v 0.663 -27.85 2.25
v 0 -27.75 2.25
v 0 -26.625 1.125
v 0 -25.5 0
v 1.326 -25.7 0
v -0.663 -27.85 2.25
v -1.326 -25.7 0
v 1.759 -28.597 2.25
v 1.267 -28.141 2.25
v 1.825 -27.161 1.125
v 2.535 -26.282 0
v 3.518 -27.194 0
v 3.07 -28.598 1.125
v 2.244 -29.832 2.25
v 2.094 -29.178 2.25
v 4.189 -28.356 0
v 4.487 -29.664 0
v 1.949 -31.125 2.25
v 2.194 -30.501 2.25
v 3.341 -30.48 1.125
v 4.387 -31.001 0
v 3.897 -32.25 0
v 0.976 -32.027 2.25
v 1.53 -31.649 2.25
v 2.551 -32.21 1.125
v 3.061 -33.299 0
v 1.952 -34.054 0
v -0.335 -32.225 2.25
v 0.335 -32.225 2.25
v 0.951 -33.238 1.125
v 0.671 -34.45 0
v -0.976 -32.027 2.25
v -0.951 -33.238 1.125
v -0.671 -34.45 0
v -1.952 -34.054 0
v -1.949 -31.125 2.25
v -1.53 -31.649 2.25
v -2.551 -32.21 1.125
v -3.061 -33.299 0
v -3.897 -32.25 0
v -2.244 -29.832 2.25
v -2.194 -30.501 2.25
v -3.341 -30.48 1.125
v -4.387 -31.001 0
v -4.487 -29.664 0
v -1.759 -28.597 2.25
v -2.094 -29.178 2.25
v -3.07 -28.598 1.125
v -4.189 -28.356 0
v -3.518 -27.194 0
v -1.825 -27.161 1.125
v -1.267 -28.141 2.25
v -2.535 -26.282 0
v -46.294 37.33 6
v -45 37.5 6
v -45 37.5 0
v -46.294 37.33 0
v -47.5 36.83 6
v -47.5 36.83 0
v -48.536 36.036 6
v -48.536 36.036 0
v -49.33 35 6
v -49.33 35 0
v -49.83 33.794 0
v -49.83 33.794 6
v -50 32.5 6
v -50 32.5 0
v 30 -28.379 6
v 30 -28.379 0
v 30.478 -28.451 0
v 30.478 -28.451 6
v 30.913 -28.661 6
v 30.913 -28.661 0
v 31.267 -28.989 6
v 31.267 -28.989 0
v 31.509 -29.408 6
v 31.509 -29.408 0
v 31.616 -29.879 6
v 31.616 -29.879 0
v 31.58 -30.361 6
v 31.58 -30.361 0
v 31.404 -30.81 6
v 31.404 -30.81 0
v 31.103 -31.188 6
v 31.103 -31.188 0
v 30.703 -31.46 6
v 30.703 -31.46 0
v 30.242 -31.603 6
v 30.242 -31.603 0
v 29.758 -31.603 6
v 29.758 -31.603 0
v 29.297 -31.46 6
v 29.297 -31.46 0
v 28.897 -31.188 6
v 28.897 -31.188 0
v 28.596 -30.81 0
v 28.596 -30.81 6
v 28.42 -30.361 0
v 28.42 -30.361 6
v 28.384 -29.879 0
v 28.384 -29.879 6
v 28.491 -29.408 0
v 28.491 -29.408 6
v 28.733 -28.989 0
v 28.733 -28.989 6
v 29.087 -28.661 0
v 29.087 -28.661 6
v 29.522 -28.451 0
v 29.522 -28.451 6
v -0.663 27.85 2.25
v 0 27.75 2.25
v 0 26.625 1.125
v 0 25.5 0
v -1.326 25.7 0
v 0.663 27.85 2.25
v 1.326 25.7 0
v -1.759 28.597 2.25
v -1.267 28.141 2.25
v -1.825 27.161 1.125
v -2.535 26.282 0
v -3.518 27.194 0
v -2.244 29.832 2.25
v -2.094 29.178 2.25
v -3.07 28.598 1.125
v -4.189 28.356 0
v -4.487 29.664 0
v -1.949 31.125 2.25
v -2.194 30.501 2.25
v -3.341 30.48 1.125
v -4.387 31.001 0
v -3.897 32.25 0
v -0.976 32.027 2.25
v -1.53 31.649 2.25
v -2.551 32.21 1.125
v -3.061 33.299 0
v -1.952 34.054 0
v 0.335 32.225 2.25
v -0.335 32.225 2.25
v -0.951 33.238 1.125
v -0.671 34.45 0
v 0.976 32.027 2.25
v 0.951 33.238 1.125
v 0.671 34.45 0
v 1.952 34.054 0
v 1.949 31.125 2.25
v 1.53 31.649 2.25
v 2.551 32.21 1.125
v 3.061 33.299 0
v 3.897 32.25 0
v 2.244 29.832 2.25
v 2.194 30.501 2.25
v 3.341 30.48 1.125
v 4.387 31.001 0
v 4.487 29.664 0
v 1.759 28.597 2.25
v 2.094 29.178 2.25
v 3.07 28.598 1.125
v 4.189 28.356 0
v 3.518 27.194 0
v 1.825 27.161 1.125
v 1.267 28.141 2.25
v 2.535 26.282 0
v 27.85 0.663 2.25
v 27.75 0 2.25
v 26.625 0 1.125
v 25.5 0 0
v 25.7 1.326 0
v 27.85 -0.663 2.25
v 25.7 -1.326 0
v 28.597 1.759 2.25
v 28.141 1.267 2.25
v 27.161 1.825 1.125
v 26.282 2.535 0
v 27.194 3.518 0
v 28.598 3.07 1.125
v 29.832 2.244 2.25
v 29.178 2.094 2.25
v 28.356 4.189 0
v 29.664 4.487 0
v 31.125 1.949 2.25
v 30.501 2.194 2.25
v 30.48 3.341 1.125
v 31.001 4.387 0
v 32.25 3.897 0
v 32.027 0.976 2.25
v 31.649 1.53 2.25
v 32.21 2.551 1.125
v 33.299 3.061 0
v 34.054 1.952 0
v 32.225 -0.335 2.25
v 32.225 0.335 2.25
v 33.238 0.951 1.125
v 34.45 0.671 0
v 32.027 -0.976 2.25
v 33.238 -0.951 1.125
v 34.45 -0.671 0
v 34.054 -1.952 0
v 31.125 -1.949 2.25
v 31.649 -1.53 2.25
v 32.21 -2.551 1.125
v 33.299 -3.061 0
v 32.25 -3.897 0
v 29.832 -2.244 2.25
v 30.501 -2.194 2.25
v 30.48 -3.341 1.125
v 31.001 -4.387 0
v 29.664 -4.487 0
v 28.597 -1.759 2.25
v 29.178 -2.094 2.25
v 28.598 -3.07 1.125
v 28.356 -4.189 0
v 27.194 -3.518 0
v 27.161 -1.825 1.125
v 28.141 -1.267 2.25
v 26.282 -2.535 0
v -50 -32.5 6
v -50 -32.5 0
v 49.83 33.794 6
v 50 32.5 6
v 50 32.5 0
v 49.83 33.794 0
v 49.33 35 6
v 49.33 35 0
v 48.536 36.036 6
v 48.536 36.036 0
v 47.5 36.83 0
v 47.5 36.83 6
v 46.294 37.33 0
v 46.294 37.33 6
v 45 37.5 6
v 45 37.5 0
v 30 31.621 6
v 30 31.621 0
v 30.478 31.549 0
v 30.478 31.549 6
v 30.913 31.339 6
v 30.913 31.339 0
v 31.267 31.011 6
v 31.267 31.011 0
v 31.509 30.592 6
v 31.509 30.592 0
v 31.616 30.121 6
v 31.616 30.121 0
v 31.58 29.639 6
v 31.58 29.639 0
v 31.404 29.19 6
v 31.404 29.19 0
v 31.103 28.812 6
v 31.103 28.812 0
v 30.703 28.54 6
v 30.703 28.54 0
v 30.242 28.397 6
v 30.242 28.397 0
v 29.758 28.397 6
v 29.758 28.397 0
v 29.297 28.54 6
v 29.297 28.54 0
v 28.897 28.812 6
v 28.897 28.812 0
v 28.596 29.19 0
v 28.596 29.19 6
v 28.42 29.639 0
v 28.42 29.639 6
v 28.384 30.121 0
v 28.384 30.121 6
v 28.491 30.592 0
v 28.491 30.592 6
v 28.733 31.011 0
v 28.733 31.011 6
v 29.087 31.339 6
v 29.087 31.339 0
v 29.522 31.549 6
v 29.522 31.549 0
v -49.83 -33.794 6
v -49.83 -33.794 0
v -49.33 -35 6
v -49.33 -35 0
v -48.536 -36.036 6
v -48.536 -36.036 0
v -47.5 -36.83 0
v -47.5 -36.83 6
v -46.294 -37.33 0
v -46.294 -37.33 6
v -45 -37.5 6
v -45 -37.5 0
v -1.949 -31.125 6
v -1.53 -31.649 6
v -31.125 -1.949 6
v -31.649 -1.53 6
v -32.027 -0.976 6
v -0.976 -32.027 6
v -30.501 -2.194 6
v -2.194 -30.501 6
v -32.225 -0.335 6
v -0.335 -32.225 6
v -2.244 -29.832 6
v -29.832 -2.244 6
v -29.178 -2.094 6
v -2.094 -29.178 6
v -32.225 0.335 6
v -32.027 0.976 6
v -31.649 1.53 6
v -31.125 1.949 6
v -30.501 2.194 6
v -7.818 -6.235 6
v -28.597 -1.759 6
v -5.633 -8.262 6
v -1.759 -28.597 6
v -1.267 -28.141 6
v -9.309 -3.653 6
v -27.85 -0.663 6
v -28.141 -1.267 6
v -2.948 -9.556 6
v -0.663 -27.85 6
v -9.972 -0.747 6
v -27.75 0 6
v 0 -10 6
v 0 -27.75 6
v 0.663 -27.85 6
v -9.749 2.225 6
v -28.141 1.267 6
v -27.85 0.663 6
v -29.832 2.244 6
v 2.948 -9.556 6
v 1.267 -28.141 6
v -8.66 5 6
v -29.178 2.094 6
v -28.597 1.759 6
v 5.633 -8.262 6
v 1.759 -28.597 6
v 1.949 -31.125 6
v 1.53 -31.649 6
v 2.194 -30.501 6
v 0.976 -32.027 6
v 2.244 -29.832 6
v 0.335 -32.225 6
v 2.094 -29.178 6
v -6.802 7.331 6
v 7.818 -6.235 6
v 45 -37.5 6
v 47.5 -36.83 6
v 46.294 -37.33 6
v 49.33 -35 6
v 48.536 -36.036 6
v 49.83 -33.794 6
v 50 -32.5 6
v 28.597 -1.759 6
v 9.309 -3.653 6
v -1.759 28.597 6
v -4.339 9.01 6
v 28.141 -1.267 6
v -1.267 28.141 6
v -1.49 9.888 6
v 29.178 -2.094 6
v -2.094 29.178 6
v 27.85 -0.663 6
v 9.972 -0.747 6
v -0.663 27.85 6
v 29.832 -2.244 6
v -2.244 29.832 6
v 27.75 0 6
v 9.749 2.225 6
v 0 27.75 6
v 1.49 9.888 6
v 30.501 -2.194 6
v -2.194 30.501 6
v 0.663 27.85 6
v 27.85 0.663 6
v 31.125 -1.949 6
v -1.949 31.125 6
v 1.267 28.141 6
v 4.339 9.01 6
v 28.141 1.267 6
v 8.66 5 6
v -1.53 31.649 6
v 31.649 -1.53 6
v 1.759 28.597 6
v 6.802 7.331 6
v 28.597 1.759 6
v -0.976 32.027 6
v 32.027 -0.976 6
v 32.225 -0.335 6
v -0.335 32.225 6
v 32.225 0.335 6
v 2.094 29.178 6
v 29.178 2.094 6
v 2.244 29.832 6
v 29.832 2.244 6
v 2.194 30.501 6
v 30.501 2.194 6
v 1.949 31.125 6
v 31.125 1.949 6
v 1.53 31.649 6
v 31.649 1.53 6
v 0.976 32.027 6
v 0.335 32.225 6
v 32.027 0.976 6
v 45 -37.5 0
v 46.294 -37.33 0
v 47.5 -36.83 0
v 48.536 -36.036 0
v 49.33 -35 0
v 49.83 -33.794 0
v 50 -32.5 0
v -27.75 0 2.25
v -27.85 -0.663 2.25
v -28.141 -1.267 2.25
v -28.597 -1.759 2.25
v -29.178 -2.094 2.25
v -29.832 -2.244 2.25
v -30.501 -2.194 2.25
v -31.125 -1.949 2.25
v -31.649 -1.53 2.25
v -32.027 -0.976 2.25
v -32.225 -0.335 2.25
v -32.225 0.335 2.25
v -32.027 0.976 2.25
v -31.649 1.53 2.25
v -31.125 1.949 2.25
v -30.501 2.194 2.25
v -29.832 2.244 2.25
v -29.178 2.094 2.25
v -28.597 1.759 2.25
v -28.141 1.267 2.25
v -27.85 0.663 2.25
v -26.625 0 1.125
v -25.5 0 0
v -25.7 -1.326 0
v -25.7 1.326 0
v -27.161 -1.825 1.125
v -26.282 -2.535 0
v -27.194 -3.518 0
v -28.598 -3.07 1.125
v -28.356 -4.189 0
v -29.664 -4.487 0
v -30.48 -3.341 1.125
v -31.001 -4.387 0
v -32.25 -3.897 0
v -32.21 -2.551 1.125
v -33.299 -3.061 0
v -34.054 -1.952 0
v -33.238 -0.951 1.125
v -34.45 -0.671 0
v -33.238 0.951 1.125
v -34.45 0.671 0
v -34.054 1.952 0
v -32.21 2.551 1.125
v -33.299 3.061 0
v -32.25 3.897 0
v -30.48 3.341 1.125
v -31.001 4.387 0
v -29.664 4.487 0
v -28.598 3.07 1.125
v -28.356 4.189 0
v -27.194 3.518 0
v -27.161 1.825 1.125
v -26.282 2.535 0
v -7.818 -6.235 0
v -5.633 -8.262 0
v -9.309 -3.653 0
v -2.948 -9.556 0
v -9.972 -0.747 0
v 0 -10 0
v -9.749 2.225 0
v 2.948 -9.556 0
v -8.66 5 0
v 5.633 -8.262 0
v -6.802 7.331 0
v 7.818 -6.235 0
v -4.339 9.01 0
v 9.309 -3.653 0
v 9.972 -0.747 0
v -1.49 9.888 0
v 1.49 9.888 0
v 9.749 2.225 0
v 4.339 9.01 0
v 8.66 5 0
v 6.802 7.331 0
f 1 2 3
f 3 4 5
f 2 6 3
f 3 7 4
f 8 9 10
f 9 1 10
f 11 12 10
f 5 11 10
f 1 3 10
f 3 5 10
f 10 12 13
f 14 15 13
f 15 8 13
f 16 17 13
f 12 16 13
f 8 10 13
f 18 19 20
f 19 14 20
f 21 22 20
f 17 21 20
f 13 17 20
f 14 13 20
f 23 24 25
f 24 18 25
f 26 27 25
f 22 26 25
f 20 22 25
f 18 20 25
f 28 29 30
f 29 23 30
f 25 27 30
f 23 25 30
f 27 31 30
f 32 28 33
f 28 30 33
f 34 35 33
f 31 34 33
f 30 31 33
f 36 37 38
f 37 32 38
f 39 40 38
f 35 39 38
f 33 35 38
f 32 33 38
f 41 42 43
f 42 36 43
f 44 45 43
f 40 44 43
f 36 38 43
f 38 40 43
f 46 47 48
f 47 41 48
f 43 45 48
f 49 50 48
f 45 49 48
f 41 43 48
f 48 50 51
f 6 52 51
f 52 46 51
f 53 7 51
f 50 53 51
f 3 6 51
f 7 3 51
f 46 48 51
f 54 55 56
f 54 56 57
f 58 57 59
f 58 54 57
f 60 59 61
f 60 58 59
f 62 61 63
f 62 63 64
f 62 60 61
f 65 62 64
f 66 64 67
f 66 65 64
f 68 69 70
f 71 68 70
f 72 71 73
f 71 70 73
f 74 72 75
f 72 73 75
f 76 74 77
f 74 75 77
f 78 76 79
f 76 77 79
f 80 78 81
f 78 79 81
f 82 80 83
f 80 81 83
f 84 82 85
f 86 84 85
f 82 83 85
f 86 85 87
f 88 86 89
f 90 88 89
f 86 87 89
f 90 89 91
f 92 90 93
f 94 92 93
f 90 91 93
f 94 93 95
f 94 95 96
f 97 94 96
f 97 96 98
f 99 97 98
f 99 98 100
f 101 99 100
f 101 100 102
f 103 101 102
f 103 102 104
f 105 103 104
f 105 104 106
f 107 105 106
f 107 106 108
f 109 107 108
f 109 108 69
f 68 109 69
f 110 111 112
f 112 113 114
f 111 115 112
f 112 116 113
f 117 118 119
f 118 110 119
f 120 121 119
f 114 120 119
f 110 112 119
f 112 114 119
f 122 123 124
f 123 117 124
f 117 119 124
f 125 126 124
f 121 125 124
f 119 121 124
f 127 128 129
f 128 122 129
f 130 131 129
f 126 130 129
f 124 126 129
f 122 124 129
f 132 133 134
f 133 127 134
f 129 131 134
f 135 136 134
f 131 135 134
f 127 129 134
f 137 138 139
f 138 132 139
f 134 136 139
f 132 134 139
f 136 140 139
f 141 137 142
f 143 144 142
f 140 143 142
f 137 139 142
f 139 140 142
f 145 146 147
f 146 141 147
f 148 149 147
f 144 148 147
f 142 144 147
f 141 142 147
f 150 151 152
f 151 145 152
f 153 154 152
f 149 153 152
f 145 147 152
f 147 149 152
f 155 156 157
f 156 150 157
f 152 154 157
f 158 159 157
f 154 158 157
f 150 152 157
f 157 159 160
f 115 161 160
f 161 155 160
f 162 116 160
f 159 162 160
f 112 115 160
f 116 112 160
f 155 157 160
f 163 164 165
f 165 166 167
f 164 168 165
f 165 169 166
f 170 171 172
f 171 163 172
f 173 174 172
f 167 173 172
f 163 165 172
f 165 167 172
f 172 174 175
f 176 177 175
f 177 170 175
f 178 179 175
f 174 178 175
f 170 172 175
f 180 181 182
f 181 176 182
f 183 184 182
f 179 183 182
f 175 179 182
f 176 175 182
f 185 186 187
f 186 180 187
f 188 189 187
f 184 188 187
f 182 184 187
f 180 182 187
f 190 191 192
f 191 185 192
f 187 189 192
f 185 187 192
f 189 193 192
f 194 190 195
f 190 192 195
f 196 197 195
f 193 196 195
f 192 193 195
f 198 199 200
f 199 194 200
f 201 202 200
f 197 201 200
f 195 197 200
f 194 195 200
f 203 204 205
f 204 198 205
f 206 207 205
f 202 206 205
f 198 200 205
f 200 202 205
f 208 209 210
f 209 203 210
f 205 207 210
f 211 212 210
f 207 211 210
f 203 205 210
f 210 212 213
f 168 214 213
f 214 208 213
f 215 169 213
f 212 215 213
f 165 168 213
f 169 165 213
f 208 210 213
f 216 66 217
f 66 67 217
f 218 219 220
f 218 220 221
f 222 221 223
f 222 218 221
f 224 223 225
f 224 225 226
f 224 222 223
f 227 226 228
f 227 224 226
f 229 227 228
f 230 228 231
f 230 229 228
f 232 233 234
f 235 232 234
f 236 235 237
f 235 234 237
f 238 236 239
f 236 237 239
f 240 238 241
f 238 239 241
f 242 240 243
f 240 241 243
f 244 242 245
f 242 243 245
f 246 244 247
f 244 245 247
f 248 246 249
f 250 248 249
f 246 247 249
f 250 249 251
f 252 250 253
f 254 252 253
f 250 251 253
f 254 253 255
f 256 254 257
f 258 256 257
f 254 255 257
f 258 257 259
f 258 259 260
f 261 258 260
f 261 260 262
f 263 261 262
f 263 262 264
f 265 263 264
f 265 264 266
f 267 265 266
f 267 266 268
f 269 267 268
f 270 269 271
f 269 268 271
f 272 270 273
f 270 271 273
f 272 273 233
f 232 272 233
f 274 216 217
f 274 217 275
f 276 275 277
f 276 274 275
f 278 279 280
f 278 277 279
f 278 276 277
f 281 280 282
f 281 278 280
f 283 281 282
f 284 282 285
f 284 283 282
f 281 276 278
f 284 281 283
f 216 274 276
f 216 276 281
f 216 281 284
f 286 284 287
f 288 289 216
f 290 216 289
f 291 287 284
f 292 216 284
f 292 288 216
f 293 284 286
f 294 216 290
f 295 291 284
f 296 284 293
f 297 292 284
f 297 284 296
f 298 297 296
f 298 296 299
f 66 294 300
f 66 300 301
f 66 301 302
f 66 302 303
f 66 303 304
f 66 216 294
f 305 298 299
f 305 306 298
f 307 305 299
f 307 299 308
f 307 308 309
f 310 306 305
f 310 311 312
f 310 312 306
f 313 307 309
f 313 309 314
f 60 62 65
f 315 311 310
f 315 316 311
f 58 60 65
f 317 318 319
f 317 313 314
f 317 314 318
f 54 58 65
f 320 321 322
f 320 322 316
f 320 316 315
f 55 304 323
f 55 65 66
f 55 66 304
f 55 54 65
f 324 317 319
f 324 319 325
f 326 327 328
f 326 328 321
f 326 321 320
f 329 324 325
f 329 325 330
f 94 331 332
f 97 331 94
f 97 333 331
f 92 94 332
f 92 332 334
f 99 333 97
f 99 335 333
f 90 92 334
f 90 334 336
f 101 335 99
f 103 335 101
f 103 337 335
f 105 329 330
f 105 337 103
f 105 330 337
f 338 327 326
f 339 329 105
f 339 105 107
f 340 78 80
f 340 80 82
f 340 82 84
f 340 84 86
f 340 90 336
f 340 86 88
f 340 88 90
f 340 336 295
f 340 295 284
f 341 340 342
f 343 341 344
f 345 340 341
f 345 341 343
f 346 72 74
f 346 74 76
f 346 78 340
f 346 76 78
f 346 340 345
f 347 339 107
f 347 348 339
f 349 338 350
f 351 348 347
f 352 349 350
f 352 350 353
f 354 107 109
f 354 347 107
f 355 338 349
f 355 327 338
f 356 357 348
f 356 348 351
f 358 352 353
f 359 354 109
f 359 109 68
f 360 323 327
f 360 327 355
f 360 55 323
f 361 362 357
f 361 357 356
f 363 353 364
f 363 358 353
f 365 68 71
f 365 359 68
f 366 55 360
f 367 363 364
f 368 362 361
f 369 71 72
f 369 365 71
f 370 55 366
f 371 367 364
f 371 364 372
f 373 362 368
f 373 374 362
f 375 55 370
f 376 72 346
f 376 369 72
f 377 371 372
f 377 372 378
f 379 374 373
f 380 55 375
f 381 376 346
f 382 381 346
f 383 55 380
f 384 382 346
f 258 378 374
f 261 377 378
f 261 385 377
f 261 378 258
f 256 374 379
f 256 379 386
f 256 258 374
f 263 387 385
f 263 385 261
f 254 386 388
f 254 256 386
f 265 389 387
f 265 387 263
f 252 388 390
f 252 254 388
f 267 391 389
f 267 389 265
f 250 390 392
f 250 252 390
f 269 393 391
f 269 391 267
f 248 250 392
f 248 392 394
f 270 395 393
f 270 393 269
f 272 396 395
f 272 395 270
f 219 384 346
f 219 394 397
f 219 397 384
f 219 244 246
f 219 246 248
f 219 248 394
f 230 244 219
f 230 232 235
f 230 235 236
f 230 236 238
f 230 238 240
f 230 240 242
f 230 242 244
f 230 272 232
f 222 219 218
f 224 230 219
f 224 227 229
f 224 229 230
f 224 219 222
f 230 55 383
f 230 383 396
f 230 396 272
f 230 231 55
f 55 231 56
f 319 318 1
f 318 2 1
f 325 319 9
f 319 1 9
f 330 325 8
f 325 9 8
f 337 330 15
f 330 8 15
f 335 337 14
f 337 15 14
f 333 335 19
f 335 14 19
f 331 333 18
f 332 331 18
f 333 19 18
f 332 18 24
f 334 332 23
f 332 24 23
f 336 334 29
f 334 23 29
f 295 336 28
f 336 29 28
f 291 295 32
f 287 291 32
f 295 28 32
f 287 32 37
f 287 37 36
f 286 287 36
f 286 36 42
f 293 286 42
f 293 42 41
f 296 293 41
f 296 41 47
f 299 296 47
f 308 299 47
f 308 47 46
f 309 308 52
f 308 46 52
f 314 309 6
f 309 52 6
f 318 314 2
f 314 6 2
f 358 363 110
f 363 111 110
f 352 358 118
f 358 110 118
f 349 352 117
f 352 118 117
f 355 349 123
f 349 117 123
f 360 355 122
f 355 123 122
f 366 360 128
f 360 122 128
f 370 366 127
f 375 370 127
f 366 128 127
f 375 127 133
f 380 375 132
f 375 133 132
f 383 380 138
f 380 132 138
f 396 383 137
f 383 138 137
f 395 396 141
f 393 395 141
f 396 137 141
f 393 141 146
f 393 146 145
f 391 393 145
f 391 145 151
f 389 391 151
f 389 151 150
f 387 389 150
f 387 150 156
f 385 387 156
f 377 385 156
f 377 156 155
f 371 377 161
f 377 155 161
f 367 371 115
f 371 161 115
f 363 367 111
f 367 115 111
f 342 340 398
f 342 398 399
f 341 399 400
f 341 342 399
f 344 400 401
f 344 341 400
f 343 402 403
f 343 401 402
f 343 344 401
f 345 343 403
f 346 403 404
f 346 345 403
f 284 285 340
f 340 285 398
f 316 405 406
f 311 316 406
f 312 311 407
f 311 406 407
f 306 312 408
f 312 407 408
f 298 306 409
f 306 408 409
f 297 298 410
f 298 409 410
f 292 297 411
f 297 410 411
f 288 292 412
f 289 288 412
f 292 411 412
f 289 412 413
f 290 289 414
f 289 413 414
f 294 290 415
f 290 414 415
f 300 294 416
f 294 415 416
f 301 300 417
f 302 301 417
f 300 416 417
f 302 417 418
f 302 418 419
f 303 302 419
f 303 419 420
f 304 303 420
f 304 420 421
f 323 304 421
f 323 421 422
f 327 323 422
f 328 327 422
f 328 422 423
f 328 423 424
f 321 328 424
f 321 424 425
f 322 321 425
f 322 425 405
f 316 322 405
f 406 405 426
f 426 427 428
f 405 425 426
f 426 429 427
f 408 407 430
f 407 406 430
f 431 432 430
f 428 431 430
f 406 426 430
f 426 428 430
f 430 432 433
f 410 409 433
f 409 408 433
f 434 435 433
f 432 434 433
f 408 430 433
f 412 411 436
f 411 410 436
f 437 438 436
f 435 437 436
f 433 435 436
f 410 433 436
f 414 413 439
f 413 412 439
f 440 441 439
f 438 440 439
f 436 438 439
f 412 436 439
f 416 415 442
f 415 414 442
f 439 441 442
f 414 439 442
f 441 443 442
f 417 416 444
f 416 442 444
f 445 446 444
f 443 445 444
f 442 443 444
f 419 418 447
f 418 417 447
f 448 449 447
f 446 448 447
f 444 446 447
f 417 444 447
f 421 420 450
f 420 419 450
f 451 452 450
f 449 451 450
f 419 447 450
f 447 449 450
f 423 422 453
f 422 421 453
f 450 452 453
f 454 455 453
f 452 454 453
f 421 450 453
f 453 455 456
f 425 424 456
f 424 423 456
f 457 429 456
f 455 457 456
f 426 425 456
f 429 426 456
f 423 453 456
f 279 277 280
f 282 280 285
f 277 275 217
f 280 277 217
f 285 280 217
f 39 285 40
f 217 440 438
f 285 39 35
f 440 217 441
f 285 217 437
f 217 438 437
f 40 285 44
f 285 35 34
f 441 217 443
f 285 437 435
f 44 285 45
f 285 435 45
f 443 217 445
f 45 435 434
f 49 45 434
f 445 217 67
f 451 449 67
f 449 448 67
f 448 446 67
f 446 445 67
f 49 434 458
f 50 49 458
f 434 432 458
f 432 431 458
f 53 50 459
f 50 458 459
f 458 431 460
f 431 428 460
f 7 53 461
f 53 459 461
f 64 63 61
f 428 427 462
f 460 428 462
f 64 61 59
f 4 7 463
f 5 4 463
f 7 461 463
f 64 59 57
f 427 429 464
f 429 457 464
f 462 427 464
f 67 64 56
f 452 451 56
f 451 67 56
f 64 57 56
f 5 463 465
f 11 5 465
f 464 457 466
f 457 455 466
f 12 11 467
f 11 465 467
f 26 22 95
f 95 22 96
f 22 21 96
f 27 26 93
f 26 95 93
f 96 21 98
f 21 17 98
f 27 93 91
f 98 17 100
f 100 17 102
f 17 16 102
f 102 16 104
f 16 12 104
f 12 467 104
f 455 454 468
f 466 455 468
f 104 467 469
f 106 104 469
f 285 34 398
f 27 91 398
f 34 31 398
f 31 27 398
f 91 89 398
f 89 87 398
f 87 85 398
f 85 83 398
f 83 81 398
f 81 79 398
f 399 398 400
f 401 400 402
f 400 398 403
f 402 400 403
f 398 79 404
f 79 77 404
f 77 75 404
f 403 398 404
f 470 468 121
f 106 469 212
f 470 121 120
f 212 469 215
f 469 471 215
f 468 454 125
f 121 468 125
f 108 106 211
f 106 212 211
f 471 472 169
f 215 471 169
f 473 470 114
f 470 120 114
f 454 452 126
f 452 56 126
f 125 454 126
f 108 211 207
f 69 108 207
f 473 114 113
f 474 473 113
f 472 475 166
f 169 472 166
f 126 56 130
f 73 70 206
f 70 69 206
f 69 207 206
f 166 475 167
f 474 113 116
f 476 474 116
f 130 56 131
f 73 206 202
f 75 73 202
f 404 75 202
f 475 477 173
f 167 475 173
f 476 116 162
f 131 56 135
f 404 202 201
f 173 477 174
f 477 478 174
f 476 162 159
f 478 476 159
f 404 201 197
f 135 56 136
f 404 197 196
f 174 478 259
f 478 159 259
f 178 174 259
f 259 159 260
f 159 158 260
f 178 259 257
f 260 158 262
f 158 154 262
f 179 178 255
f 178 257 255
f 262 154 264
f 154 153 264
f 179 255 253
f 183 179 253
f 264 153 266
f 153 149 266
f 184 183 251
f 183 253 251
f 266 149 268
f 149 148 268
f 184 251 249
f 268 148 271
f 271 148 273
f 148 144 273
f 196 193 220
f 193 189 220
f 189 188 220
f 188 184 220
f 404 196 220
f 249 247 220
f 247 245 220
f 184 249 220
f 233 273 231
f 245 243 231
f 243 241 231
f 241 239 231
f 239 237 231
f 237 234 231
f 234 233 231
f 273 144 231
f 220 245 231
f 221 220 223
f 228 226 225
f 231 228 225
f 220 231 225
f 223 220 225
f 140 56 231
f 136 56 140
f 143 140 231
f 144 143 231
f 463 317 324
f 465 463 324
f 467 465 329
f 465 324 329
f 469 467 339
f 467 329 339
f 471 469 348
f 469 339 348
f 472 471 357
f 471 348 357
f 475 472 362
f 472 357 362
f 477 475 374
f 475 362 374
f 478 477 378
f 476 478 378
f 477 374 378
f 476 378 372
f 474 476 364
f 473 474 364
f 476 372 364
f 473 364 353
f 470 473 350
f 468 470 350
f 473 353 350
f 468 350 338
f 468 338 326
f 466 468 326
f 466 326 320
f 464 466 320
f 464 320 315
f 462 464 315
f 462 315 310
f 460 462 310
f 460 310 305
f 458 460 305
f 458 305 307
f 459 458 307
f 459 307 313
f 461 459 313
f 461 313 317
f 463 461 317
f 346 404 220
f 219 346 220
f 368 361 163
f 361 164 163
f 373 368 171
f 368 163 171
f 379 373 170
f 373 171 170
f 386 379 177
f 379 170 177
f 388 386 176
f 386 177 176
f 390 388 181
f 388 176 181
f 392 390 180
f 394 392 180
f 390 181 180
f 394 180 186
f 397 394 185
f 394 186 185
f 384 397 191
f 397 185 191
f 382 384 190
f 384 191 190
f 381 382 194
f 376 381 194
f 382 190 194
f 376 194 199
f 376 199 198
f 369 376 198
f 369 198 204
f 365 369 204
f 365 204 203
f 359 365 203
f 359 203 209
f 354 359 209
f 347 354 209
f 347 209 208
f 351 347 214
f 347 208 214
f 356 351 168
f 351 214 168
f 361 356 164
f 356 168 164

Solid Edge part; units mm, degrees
sketch "Sketch1" plane through (60.3162, 60.3162, 0) normal (0, 0, 1) x (1, 0, 0)
  line L0 (-110.3162, -97.8162) -> (-10.3162, -97.8162)
  line L1 (-10.3162, -97.8162) -> (-10.3162, -22.8162)
  line L2 (-10.3162, -22.8162) -> (-110.3162, -22.8162)
  line L3 (-110.3162, -22.8162) -> (-110.3162, -97.8162)
extrude "Protrusion1" add sketch "Sketch1" along normal blind 6
fillet "Verrundung_1" radius 5 1 edges at (50, 37.5, 3)
fillet "Verrundung_2" radius 5 3 edges at (50, -37.5, 3) (-50, -37.5, 3) (-50, 37.5, 3)
hole "Bohrung_1" at (0, 0, 6) direction (0, 0, -1) diameter 20 end up to next
hole "Bohrung_2" at (0, -30, 0) direction (0, 0, 1) diameter 4.5 end up to next countersink diameter 9 countersink angle 90
pattern_circular "Pattern1" count 4 over 360 about axis through (0, 0, 0) along (0, 0, 1) of "Bohrung_2"
hole "Bohrung_4" at (30, -30, 0) direction (0, 0, 1) diameter 3.242 end up to next thread major 4 thread length 10
hole "Hole1" at (30, 30, 0) direction (0, 0, 1) diameter 3.242 end up to next thread major 4 thread length 10
mirror "Mirror1" [suppressed]
properties material "Aluminium, 1060"
